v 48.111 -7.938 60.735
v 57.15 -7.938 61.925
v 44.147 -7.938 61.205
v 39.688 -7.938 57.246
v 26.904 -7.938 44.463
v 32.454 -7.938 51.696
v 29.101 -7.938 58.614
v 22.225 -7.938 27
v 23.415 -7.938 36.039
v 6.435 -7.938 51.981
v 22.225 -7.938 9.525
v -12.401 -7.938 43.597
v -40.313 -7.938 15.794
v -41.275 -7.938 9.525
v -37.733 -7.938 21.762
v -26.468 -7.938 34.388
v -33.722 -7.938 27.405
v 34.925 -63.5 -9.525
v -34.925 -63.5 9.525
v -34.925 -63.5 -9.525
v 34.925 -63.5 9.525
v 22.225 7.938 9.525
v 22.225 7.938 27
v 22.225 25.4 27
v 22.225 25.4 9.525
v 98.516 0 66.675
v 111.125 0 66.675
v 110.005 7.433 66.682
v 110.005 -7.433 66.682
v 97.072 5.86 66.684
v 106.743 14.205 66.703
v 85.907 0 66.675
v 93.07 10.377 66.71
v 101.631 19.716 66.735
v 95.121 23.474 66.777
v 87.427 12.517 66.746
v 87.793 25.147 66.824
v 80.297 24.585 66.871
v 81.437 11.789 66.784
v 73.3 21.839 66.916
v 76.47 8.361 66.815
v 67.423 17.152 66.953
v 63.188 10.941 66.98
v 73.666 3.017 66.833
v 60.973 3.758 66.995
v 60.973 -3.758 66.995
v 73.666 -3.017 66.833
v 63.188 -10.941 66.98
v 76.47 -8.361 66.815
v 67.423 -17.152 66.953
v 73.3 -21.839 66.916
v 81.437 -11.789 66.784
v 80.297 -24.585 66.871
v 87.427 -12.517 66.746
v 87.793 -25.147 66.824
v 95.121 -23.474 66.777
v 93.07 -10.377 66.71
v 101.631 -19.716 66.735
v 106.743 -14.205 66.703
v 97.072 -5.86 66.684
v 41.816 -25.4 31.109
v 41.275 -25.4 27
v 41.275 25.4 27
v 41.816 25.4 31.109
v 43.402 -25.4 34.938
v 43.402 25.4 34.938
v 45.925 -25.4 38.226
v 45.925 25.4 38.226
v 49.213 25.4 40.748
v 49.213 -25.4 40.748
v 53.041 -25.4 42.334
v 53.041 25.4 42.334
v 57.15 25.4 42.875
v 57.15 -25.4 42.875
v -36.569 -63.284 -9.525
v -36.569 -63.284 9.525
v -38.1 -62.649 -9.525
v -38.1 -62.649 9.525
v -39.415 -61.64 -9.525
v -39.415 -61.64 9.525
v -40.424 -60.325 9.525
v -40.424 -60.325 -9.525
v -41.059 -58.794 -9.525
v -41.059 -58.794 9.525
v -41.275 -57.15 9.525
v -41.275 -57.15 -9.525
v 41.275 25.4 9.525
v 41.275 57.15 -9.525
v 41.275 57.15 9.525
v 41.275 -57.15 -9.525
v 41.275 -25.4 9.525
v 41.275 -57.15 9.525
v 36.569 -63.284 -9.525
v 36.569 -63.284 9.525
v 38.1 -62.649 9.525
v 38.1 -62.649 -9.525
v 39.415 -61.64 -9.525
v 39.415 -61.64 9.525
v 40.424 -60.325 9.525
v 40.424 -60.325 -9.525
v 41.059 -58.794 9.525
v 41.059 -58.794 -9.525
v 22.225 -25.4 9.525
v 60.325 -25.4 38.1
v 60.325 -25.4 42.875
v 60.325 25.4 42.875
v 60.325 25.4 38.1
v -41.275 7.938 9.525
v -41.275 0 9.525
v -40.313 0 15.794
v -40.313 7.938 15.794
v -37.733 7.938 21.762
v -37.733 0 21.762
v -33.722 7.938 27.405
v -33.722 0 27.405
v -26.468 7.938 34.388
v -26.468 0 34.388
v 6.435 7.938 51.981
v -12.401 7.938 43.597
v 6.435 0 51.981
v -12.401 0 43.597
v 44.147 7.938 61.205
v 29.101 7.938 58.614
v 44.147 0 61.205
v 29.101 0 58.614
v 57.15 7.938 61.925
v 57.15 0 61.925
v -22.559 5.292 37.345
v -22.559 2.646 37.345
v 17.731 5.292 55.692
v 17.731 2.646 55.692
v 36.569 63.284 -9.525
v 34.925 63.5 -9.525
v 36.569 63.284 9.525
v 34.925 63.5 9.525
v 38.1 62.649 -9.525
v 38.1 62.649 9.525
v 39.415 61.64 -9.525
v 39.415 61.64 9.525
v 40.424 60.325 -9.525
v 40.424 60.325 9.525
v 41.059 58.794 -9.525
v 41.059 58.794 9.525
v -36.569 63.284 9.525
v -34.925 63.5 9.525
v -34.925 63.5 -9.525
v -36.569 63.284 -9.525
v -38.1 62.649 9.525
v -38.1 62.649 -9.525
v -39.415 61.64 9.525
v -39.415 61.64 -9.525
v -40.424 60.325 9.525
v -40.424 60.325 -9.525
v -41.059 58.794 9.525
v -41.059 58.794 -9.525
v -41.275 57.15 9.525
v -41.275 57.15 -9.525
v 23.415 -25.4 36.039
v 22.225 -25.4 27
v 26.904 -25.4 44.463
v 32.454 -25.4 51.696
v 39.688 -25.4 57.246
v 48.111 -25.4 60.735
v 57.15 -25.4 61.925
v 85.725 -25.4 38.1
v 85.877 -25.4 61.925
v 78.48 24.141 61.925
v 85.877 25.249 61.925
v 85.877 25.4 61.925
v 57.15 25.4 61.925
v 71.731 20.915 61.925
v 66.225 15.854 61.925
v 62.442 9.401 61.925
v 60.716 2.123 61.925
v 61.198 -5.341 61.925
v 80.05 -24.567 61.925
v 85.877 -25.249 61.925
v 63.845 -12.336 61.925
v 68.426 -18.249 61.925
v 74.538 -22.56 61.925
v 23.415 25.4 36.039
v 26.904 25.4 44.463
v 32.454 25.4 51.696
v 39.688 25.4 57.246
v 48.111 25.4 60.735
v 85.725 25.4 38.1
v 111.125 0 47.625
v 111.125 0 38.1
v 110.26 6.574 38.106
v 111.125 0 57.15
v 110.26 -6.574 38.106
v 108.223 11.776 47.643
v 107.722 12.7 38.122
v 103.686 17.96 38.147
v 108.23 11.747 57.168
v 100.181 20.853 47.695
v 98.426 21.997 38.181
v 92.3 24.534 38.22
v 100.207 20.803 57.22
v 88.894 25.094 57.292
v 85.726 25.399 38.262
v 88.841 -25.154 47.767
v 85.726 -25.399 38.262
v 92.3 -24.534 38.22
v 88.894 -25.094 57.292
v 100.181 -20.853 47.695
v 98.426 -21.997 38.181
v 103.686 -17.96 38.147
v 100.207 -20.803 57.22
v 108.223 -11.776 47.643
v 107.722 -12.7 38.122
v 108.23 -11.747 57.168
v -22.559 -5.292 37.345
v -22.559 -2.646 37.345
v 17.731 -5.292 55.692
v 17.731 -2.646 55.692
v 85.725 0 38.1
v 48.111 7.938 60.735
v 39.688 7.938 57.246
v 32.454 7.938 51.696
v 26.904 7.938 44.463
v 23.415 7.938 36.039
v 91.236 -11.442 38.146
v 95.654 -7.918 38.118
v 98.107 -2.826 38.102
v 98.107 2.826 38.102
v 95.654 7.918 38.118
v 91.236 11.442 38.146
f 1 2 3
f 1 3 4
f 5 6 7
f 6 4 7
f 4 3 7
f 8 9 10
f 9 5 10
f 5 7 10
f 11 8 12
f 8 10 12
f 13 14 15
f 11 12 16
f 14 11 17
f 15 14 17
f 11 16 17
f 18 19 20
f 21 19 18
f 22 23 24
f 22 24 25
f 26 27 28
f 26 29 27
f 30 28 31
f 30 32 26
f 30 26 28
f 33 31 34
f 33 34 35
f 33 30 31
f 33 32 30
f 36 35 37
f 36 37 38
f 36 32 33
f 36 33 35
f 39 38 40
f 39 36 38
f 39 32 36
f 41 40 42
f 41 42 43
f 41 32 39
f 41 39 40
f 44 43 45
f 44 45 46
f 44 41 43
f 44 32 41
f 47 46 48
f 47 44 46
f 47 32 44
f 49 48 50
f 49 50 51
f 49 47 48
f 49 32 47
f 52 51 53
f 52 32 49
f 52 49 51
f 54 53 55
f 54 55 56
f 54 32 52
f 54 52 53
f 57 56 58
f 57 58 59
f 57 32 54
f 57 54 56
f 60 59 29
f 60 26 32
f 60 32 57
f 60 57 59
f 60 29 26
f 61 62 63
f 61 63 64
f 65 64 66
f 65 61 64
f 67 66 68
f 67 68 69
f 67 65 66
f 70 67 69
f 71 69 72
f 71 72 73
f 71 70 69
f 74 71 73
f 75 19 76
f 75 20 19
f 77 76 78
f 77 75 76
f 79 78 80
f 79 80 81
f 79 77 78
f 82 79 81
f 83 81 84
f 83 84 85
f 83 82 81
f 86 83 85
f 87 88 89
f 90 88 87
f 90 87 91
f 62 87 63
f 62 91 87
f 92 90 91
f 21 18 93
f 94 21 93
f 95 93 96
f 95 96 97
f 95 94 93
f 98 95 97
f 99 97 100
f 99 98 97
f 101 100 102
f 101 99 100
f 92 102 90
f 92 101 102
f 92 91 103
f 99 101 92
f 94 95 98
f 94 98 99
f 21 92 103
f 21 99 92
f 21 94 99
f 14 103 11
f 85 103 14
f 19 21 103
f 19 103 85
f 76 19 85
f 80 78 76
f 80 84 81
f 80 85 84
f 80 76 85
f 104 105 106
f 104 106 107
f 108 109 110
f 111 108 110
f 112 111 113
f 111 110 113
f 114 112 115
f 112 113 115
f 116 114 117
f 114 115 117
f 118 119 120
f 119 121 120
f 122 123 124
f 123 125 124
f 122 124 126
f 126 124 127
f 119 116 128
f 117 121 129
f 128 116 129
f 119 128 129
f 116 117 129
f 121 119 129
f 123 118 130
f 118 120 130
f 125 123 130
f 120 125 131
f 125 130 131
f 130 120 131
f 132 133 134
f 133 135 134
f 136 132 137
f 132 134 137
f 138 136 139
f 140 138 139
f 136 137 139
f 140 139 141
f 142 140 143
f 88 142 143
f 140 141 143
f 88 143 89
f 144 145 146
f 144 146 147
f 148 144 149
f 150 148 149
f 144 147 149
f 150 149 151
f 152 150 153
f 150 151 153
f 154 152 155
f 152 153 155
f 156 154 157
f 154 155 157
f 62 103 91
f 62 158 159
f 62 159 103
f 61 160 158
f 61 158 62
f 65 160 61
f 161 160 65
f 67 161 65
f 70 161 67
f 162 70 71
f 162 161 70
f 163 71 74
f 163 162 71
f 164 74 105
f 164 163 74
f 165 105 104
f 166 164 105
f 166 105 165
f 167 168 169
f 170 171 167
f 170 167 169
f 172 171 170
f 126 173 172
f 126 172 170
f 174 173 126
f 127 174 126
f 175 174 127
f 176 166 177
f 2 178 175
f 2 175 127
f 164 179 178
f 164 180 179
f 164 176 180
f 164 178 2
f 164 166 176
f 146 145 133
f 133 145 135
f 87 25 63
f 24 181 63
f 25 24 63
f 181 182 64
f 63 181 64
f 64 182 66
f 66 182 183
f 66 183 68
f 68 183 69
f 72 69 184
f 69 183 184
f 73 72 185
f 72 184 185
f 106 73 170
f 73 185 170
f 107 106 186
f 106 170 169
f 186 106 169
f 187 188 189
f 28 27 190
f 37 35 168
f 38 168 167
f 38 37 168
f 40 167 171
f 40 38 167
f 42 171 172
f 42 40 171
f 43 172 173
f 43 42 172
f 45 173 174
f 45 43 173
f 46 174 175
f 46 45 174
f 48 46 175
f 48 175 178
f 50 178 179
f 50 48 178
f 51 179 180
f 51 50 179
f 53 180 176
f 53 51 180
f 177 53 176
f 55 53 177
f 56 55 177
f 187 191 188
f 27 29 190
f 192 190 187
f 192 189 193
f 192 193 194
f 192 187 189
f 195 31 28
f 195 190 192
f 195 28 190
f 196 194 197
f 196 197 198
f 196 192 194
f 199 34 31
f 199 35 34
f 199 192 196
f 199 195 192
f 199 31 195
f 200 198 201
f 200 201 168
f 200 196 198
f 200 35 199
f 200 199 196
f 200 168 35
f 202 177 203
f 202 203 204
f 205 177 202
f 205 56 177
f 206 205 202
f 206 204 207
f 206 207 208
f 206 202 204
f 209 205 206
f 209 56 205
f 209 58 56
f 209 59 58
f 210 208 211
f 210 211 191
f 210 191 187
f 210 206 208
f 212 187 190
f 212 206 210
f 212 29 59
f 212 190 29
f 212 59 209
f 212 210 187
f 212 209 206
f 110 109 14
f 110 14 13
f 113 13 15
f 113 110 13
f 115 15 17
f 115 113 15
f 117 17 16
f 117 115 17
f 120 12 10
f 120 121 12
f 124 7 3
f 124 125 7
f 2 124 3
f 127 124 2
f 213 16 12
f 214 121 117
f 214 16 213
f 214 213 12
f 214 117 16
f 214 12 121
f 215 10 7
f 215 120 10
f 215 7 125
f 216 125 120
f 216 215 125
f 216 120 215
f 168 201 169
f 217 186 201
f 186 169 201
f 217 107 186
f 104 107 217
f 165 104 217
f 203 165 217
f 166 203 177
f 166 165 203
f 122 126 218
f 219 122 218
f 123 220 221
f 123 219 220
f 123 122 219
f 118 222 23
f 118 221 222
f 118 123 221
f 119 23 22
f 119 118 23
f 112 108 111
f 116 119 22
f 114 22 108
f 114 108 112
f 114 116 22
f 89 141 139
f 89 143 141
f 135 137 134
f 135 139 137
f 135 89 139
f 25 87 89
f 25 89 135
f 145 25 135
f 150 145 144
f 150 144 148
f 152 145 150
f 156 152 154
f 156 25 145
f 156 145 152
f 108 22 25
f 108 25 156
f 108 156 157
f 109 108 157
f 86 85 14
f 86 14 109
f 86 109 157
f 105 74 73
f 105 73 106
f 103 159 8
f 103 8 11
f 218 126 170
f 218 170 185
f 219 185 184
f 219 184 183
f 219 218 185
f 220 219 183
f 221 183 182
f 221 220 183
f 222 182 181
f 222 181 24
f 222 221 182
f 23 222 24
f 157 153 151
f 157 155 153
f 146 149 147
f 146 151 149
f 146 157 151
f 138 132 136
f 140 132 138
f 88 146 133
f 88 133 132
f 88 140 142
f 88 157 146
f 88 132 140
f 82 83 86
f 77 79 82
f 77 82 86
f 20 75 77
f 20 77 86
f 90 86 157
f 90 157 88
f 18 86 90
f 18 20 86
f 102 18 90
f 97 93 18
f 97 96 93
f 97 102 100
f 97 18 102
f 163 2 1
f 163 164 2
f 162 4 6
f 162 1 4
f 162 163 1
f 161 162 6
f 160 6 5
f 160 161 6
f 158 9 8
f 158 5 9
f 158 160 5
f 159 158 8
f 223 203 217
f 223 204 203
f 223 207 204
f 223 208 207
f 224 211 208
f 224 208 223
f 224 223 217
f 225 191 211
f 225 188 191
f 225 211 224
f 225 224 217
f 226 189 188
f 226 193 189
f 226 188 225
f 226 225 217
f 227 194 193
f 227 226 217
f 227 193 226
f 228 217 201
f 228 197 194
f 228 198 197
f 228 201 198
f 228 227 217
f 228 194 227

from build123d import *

# Parameters (mm, degrees)
F1_DEPTH = 63.5
F2_DEPTH = 25.4
F3_DEPTH = 7.9375
F5_R     = 6.35


with BuildPart() as f1:
    # F0 (on Front) → F1 (new body, symmetric)
    with BuildSketch(Plane.XZ):
        Polygon((-41.275, 9.525), (-41.275, -9.525), (41.275, -9.525), (41.275, 9.525), (22.225, 9.525), align=None)
    extrude(amount=F1_DEPTH, both=True)

    # F0 (on Front) → F2 (join, symmetric)
    with BuildSketch(Plane.XZ):
        with BuildLine():
            Line((22.225, 9.525), (41.275, 9.525))
            Line((41.275, 9.525), (41.275, 27.0002))
            ThreePointArc((41.275, 27.0002), (45.9246798487, 38.2255201513), (57.15, 42.8752))
            Line((57.15, 42.8752), (60.325, 42.8752))
            Line((60.325, 42.8752), (60.325, 61.9252))
            Line((60.325, 61.9252), (57.15, 61.9252))
            ThreePointArc((57.15, 61.9252), (32.4542956671, 51.6959043329), (22.225, 27.0002))
            Line((22.225, 27.0002), (22.225, 9.525))
        make_face()
        Polygon((75.878282736, 61.9252), (60.325, 61.9252), (60.325, 42.8752), (60.325, 38.1), (85.725, 38.1), (85.8768074448, 61.9252), align=None)
    extrude(amount=F2_DEPTH, both=True)

    # F0 (on Front) → F3 (join, symmetric)
    with BuildSketch(Plane.XZ):
        with BuildLine():
            add(Edge.make_bspline(
                [(-41.275, 9.525), (-40.8265404403, 41.2002727389), (25.646481663, 62.6290813088), (57.15, 61.9252)],
                knots=[0, 0, 0, 0, 111.5045361635, 111.5045361635, 111.5045361635, 111.5045361635], degree=3))
            Line((-41.275, 9.525), (22.225, 9.525))
            Line((22.225, 9.525), (22.225, 27.0002))
            ThreePointArc((22.225, 27.0002), (32.4542956671, 51.6959043329), (57.15, 61.9252))
        make_face()
    extrude(amount=F3_DEPTH, both=True)

    # F0 (on Front) → F4 (revolve)
    with BuildSketch(Plane.XZ):
        Polygon((111.125, 66.675), (85.9070718288, 66.675), (85.8768074448, 61.9252), (85.725, 38.1), (111.125, 38.1), align=None)
    revolve(axis=Axis((85.8160359144, 0, 52.3875), (0.0063715882, 0, 0.9999797012)))

    # F5
    f5_edges = [f1.edges().sort_by_distance(p)[0] for p in [
        (41.275, -63.5, 0),
        (-41.275, -63.5, 0),
        (41.275, 63.5, 0),
        (-41.275, 63.5, 0),
    ]]
    fillet(f5_edges, radius=F5_R)


solid = f1.part
